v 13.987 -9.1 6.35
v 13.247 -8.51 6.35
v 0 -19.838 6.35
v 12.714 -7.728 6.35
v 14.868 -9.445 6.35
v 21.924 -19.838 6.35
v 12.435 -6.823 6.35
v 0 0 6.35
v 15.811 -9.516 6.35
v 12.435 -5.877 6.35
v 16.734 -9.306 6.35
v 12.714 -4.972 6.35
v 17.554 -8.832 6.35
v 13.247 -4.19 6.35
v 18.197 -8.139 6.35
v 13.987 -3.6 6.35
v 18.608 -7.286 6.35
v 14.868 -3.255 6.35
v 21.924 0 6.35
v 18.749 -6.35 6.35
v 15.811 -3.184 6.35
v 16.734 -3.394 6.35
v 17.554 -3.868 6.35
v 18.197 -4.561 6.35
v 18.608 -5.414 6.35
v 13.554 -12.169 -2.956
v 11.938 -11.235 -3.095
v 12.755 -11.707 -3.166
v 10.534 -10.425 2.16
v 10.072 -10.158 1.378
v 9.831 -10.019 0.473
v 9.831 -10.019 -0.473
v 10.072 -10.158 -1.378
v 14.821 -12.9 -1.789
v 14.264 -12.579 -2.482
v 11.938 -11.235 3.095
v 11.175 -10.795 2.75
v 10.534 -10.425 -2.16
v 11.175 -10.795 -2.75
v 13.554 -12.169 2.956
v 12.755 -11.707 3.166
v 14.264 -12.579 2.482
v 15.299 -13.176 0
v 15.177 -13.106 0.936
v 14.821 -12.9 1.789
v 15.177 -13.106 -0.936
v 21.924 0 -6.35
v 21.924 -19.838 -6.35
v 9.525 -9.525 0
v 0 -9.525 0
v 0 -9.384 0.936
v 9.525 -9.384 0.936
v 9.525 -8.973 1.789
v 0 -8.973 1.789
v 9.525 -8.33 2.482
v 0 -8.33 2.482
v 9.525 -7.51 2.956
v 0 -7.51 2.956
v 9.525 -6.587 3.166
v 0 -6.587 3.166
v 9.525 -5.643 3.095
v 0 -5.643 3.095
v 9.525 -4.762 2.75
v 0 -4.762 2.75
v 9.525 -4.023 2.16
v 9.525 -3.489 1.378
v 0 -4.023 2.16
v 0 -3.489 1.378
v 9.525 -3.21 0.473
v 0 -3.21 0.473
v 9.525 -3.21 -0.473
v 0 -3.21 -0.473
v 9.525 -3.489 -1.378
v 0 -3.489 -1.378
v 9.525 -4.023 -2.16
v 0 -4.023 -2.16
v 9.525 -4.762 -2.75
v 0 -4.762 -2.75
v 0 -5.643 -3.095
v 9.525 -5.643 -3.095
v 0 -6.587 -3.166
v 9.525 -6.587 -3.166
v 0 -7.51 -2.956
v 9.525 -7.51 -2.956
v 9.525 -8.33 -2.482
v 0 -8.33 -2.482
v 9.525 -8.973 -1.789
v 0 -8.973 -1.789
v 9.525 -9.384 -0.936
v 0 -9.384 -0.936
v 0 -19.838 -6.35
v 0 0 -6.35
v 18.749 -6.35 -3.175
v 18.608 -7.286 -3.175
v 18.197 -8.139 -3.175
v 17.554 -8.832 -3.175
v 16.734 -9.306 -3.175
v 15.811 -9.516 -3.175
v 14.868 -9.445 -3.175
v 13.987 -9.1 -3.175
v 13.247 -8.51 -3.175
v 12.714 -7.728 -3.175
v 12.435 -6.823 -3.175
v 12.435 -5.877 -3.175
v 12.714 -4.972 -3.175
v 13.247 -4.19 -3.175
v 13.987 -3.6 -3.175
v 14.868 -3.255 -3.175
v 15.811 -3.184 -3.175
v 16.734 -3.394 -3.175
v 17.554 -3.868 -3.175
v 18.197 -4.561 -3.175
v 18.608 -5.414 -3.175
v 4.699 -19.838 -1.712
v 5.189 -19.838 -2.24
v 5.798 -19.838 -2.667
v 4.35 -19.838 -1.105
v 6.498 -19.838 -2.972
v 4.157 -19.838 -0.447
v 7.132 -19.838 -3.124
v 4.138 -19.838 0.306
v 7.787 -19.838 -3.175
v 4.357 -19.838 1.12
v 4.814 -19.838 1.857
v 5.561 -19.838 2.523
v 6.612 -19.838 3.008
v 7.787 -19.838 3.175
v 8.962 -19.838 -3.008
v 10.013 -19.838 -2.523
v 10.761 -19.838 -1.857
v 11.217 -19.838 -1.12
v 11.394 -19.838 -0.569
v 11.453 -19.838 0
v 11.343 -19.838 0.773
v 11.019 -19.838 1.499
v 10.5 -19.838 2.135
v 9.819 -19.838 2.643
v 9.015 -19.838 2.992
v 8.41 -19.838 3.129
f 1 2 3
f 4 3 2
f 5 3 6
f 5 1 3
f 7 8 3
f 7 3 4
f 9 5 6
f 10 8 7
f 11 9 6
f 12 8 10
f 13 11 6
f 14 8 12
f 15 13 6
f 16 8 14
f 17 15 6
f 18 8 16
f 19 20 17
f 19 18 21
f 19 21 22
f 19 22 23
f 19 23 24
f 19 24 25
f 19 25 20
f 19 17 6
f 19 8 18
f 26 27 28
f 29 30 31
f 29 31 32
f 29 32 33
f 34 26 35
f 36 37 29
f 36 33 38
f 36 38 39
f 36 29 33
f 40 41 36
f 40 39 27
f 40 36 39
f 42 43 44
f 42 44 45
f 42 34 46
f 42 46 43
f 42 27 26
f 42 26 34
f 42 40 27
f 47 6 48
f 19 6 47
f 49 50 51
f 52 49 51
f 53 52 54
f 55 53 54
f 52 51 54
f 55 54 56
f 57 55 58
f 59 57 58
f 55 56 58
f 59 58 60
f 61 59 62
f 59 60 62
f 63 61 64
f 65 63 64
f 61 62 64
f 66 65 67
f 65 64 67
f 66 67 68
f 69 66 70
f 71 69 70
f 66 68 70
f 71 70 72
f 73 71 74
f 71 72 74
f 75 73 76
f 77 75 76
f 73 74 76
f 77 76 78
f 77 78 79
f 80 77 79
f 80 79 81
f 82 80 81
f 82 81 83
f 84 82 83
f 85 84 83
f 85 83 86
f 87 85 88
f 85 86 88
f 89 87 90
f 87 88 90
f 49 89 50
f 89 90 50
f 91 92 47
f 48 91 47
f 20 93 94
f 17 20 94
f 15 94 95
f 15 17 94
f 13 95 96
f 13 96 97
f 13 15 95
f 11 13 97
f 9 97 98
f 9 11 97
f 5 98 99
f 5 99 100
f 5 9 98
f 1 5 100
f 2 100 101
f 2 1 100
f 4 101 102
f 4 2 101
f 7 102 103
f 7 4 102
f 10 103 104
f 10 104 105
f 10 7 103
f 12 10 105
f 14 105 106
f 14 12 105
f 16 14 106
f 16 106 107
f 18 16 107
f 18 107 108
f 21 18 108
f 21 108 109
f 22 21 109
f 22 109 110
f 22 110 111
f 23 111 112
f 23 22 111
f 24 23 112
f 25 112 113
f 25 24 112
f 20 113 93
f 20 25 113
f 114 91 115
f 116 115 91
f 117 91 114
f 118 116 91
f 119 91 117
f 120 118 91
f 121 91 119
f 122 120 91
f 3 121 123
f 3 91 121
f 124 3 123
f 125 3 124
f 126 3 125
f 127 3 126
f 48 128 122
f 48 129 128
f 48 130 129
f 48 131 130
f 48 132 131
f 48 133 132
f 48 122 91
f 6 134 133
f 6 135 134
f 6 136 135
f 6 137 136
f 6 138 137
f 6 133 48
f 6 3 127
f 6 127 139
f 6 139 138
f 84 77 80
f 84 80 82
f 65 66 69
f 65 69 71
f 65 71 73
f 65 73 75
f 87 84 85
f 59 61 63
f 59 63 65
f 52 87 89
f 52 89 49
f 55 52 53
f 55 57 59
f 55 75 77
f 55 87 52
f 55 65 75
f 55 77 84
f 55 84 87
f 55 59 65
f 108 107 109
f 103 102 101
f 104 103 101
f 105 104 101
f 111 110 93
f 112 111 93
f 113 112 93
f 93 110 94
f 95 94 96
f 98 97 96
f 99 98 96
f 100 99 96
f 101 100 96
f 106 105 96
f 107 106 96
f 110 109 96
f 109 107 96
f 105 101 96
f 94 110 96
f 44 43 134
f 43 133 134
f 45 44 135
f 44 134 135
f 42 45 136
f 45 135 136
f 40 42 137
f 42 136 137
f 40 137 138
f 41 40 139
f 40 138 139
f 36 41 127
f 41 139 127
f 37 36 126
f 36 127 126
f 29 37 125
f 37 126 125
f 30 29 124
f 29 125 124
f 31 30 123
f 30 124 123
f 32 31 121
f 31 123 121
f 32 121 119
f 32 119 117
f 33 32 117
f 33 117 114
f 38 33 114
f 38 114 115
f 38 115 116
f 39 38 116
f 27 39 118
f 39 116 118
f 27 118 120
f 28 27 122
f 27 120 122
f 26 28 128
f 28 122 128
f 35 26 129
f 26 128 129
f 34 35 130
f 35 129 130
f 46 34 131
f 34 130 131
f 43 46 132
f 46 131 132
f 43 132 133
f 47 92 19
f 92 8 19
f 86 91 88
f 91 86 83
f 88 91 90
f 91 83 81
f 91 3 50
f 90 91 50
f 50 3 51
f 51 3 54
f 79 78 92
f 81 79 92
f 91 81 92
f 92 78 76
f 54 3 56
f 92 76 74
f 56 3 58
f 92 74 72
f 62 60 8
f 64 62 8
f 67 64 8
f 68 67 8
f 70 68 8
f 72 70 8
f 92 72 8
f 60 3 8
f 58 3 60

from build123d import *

# Parameters (mm, degrees)
SKETCH3_W                      = 21.924187445
SKETCH3_H                      = 19.837641971
BOSS_EXTRUDE1_DEPTH            = 6.35
SKETCH4_R                      = 3.175
CUT_EXTRUDE1_DEPTH             = 9.525
SKETCH5_R                      = 3.175
CUT_EXTRUDE5_DEPTH             = 9.525
CUT_EXTRUDE5_DIRECTION_2_REACH = 27.174
SKETCH6_R                      = 3.175
CUT_EXTRUDE6_DEPTH             = 9.525


with BuildPart() as part:
    # Sketch3 → Boss-Extrude1 (new, symmetric)
    with BuildSketch(Plane.XY):
        with Locations((10.962093723, -9.918820986)):
            Rectangle(SKETCH3_W, SKETCH3_H)
    extrude(amount=BOSS_EXTRUDE1_DEPTH, both=True)

    # Sketch4 → Cut-Extrude1 (cut)
    with BuildSketch(Plane.ZY):
        with Locations(Location((0, -6.35, 0), (0, 0, 270))):
            Circle(SKETCH4_R)
    extrude(amount=-CUT_EXTRUDE1_DEPTH, mode=Mode.SUBTRACT)

    # Sketch5 → Cut-Extrude5 (cut)
    with BuildSketch(Plane(origin=(7.787093723, -19.837641971, 0), x_dir=(-0.8660254037844382, 0.500000000000001, 0), z_dir=(-0.500000000000001, -0.8660254037844382, 0))):
        with Locations(Location((0, 0, 0), (0, 0, 180))):
            Circle(SKETCH5_R)
    extrude(amount=-CUT_EXTRUDE5_DEPTH, mode=Mode.SUBTRACT)

    # Sketch5 → Cut-Extrude5 direction 2 (cut, up to next)
    with BuildSketch(Plane(origin=(7.787093723, -19.837641971, 0), x_dir=(-0.8660254037844382, 0.500000000000001, 0), z_dir=(-0.500000000000001, -0.8660254037844382, 0)), mode=Mode.PRIVATE) as cut_extrude5_direction_2_sk1:
        with Locations(Location((0, 0, 0), (0, 0, 180))):
            Circle(SKETCH5_R)
    cut_extrude5_direction_2_tool1 = extrude(cut_extrude5_direction_2_sk1.sketch, amount=CUT_EXTRUDE5_DIRECTION_2_REACH, mode=Mode.PRIVATE) & part.part
    add(cut_extrude5_direction_2_tool1.solids().sort_by_distance((7.787094, -19.837642, 0))[0], mode=Mode.SUBTRACT)

    # Sketch6 → Cut-Extrude6 (cut)
    with BuildSketch(Plane(origin=(0, 0, 6.35), x_dir=(-1, 0, 0), z_dir=(0, 0, -1))):
        with Locations(Location((-15.574187445, -6.35, 0), (0, 0, 180))):
            Circle(SKETCH6_R)
    extrude(amount=CUT_EXTRUDE6_DEPTH, mode=Mode.SUBTRACT)


solid = part.part
